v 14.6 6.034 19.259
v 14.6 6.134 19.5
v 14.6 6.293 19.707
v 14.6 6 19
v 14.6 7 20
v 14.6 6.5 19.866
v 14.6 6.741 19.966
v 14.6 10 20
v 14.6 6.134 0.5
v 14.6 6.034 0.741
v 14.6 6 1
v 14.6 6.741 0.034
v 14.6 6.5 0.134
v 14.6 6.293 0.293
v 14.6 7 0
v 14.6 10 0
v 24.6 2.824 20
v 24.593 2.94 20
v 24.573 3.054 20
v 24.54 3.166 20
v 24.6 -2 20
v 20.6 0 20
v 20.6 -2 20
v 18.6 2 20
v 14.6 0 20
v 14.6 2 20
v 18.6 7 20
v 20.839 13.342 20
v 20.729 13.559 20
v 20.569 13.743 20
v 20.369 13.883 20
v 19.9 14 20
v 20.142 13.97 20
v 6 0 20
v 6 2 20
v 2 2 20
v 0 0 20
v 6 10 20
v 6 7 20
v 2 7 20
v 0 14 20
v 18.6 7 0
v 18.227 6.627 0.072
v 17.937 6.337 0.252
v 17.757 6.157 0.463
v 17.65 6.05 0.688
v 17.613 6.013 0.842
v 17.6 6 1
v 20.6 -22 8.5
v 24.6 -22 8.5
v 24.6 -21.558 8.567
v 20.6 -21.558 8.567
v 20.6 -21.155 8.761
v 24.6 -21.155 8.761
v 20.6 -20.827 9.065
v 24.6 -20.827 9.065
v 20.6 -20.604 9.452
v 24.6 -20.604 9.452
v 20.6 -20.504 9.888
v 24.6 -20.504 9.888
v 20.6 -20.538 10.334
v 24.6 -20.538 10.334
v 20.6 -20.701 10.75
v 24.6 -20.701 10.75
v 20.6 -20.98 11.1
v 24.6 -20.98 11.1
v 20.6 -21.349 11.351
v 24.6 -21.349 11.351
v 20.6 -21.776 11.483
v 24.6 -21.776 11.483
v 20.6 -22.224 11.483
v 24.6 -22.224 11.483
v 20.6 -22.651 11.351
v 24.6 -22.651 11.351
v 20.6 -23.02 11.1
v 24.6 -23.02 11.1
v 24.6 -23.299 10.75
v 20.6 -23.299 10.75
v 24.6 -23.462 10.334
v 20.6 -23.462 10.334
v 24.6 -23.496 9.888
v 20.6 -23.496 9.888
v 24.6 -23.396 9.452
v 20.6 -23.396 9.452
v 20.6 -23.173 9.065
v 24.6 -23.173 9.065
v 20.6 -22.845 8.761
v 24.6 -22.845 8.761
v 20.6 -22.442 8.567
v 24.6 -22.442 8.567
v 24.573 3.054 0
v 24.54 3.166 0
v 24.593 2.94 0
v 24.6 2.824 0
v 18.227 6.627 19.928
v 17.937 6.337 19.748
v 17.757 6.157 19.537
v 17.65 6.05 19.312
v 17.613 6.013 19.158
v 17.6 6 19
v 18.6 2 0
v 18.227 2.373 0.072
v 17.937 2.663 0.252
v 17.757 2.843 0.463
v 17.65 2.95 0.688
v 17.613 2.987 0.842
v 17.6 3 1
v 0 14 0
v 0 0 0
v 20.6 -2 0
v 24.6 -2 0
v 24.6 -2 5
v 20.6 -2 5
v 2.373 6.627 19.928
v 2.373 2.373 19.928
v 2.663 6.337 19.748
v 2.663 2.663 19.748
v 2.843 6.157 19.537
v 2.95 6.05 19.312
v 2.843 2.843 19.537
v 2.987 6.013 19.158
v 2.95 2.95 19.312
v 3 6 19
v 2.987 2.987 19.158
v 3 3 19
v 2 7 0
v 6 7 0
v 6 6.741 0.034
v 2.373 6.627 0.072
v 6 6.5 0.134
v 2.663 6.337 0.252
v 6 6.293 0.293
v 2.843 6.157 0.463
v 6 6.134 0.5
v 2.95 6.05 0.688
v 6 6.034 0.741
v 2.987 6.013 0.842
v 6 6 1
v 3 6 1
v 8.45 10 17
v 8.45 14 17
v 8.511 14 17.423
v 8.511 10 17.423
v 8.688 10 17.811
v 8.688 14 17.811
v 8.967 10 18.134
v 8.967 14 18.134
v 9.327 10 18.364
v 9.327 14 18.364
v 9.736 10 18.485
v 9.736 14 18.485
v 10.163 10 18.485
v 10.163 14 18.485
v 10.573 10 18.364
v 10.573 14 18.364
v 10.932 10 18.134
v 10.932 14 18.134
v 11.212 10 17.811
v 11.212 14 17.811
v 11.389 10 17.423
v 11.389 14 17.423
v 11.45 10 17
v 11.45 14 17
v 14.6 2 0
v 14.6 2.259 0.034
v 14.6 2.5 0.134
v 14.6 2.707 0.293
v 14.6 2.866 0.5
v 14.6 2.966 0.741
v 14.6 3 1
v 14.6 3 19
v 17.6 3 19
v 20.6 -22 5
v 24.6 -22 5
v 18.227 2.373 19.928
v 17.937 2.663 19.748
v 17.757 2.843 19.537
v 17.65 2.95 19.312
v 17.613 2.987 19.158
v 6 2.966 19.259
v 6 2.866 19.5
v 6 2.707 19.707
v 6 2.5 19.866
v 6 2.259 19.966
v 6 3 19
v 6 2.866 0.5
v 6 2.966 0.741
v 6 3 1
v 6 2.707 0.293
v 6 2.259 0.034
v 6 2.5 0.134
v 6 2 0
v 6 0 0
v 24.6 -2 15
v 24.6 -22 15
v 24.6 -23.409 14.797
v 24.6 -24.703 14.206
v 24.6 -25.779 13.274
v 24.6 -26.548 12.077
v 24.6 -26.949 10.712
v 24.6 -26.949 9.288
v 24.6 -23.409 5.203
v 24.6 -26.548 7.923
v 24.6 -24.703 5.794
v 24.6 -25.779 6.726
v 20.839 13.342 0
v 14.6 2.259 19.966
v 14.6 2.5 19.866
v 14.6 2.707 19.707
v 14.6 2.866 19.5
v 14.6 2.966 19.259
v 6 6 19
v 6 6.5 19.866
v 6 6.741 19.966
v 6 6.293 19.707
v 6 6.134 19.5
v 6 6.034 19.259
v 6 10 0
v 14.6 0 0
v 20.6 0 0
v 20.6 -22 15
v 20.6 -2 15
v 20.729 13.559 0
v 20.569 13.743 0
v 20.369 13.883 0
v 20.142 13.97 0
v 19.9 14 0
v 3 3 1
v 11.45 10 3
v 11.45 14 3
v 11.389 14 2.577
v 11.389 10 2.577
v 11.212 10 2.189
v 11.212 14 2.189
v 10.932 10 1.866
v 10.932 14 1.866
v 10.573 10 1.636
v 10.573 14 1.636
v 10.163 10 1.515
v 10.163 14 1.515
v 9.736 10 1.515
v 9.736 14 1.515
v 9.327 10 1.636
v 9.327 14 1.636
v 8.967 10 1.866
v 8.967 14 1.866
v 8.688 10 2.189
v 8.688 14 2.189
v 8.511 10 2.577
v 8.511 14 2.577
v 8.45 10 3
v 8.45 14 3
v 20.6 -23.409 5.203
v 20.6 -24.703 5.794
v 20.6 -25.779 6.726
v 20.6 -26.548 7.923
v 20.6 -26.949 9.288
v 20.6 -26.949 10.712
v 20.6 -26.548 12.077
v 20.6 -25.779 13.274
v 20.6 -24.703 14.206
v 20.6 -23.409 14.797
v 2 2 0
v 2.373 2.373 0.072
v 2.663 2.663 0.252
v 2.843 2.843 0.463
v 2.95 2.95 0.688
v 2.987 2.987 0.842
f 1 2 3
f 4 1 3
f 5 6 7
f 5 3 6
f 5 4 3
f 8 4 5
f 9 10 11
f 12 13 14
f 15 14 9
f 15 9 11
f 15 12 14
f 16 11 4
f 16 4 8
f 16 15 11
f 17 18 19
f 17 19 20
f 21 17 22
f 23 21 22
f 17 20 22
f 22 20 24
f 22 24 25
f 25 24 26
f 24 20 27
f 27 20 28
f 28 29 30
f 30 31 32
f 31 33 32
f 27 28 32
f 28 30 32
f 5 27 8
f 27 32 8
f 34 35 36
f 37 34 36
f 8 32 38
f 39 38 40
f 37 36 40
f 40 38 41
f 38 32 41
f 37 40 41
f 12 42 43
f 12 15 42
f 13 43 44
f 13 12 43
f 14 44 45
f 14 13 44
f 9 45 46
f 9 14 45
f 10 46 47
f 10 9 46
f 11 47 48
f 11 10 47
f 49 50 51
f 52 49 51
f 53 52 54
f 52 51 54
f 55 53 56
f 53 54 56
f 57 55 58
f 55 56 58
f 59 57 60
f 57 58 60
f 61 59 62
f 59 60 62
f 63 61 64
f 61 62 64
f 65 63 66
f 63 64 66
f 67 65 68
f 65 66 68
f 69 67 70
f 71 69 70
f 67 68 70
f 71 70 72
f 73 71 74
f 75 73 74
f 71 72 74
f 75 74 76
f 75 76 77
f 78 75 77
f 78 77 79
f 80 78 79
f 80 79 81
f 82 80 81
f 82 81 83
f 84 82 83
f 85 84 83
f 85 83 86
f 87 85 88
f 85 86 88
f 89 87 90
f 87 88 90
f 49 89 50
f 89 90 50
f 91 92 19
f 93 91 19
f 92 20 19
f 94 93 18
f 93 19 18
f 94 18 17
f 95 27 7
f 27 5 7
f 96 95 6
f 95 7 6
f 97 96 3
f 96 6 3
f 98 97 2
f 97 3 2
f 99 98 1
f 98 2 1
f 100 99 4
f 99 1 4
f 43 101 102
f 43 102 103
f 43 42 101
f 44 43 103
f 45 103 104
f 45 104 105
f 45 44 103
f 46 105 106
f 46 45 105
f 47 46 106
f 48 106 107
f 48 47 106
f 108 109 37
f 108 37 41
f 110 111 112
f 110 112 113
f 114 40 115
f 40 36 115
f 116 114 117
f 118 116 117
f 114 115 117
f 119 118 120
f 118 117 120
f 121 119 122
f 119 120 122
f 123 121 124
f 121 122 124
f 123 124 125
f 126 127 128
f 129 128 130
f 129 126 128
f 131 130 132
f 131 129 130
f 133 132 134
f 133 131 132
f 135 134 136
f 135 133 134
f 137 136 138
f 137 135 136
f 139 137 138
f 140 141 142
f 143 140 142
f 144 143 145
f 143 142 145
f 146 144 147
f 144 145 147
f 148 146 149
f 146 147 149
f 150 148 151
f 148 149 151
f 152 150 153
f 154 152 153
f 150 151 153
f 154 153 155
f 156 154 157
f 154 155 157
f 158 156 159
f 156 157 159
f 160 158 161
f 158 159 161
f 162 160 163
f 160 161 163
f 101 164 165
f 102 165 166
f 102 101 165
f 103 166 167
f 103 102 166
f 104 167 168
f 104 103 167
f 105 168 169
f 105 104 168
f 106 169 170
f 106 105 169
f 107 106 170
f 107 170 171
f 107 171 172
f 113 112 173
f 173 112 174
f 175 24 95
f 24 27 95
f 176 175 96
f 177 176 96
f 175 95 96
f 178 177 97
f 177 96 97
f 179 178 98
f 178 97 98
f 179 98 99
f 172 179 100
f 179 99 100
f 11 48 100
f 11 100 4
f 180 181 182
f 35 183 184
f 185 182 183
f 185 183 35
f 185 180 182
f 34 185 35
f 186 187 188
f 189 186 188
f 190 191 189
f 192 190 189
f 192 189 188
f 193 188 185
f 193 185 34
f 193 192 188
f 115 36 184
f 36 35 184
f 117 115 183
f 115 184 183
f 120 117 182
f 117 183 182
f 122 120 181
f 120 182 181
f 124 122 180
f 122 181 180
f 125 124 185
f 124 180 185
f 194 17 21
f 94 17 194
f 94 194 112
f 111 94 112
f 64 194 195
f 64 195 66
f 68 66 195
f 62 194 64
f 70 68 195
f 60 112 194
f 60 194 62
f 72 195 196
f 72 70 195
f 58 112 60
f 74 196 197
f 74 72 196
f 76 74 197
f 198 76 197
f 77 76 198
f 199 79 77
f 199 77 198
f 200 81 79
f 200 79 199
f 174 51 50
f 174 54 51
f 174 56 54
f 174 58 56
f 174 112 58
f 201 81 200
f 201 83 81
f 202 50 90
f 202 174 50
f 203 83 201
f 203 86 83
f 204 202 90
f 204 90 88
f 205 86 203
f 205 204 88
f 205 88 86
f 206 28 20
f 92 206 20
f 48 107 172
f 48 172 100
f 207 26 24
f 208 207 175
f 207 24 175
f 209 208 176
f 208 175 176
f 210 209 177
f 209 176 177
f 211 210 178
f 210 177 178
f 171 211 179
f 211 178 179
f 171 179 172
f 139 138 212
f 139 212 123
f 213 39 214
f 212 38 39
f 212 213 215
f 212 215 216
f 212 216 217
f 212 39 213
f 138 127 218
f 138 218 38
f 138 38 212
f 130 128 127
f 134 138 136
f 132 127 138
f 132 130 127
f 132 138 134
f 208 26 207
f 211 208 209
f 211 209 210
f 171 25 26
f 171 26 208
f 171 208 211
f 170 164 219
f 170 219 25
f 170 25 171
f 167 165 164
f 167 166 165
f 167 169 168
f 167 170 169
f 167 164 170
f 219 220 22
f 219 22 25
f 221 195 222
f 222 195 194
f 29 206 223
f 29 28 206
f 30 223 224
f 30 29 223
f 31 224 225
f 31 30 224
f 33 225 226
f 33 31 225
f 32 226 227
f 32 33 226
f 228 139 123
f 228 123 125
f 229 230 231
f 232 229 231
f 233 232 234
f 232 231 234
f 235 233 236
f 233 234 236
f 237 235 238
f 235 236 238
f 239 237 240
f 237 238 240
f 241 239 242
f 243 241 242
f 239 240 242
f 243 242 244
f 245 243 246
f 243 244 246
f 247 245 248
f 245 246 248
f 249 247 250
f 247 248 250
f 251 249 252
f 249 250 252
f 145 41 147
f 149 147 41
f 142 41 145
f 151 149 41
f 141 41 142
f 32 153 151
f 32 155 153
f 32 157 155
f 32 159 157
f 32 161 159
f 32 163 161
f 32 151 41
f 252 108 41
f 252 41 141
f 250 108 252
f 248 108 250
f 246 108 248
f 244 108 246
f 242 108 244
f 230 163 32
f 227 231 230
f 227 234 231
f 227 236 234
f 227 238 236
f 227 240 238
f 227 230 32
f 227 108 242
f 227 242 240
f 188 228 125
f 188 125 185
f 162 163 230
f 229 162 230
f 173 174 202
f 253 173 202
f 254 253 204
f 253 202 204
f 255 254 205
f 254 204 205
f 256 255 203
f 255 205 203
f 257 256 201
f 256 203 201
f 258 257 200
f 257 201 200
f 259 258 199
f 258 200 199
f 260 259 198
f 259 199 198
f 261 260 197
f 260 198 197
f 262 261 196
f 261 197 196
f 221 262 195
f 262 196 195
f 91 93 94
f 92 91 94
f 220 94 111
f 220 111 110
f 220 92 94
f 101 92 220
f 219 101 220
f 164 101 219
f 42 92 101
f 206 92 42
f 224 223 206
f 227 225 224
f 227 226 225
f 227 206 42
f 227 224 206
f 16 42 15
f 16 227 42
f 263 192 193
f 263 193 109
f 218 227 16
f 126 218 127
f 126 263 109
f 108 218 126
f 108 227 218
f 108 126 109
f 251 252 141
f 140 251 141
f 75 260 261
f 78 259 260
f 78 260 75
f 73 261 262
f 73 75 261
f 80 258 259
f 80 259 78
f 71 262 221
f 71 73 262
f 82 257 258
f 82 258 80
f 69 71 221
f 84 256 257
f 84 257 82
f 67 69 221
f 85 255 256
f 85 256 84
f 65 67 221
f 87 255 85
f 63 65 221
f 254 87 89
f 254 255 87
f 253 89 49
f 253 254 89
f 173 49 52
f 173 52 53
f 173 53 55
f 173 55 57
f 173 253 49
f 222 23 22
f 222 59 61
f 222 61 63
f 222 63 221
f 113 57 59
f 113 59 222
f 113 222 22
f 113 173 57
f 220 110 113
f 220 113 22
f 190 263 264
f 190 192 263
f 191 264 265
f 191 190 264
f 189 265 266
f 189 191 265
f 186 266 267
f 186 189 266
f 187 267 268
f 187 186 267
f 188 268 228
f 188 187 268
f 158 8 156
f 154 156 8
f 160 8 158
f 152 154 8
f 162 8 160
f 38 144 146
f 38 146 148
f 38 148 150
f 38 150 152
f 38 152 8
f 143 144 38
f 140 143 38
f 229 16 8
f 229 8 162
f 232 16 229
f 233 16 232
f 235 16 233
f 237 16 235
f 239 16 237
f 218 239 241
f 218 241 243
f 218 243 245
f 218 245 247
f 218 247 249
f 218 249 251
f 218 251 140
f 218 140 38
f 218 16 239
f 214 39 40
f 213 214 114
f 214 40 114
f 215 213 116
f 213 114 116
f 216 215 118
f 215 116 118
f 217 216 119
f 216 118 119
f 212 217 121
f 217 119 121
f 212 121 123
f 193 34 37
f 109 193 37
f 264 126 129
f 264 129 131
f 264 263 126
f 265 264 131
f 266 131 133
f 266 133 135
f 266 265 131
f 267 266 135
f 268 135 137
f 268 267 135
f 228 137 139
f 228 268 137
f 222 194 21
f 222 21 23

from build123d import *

# Parameters (mm, degrees)
EXTRUDE_1_DEPTH     = 20
SKETCH_2_R          = 1.5
EXTRUDE_2_DEPTH     = 4
FILLET_5_R          = 1
CUT_EXTRUDE_1_REACH = 53.828


with BuildPart() as part:
    # 草图1 → 凸台-拉伸1 (new body)
    with BuildSketch(Plane.XY):
        Polygon((20.6, 14), (24.6, 3), (24.6, -2), (20.6, -2), (20.6, 0), (14.6, 0), (14.6, 3), (17.6, 3), (17.6, 6), (14.6, 6), (14.6, 10), (6, 10), (6, 6), (3, 6), (3, 3), (6, 3), (6, 0), (0, 0), (0, 14), align=None)
    extrude(amount=EXTRUDE_1_DEPTH)

    # 草图2 → 凸台-拉伸2 (add)
    with BuildSketch(Plane(origin=(24.6, 0, 0), x_dir=(0, 0, -1), z_dir=(1, 0, 0))):
        with BuildLine():
            Line((-15, -2), (-5, -2))
            Line((-5, -2), (-5, -22))
            ThreePointArc((-5, -22), (-10, -27), (-15, -22))
            Line((-15, -22), (-15, -2))
        make_face()
        with Locations((-10, -22)):
            Circle(SKETCH_2_R, mode=Mode.SUBTRACT)
    extrude(amount=-EXTRUDE_2_DEPTH)

    # 圆角5
    fillet_5_edges = [part.edges().sort_by_distance(p)[0] for p in [
        (16.1, 3, 0),
        (17.6, 4.5, 0),
        (16.1, 6, 0),
        (4.5, 6, 0),
        (3, 4.5, 0),
        (4.5, 3, 0),
        (4.5, 3, 20),
        (3, 4.5, 20),
        (20.6, 14, 10),
        (24.6, 3, 10),
        (4.5, 6, 20),
        (16.1, 6, 20),
        (17.6, 4.5, 20),
        (16.1, 3, 20),
    ]]
    fillet(fillet_5_edges, radius=FILLET_5_R)

    # 草图3 → 切除-拉伸1 (cut, up to next)
    with BuildSketch(Plane(origin=(0, 14, 0), x_dir=(1, 0, 0), z_dir=(0, 1, 0)), mode=Mode.PRIVATE) as cut_extrude_1_sk1:
        with BuildLine():
            Line((8.449786368, -3), (8.449786368, -17))
            ThreePointArc((8.449786368, -17), (9.949786368, -18.5), (11.449786368, -17))
            Line((11.449786368, -17), (11.449786368, -3))
            ThreePointArc((11.449786368, -3), (9.949786368, -1.5), (8.449786368, -3))
        make_face()
    cut_extrude_1_tool1 = extrude(cut_extrude_1_sk1.sketch, amount=-CUT_EXTRUDE_1_REACH, mode=Mode.PRIVATE) & part.part
    add(cut_extrude_1_tool1.solids().sort_by_distance((9.949786, 14, 10))[0], mode=Mode.SUBTRACT)


solid = part.part
